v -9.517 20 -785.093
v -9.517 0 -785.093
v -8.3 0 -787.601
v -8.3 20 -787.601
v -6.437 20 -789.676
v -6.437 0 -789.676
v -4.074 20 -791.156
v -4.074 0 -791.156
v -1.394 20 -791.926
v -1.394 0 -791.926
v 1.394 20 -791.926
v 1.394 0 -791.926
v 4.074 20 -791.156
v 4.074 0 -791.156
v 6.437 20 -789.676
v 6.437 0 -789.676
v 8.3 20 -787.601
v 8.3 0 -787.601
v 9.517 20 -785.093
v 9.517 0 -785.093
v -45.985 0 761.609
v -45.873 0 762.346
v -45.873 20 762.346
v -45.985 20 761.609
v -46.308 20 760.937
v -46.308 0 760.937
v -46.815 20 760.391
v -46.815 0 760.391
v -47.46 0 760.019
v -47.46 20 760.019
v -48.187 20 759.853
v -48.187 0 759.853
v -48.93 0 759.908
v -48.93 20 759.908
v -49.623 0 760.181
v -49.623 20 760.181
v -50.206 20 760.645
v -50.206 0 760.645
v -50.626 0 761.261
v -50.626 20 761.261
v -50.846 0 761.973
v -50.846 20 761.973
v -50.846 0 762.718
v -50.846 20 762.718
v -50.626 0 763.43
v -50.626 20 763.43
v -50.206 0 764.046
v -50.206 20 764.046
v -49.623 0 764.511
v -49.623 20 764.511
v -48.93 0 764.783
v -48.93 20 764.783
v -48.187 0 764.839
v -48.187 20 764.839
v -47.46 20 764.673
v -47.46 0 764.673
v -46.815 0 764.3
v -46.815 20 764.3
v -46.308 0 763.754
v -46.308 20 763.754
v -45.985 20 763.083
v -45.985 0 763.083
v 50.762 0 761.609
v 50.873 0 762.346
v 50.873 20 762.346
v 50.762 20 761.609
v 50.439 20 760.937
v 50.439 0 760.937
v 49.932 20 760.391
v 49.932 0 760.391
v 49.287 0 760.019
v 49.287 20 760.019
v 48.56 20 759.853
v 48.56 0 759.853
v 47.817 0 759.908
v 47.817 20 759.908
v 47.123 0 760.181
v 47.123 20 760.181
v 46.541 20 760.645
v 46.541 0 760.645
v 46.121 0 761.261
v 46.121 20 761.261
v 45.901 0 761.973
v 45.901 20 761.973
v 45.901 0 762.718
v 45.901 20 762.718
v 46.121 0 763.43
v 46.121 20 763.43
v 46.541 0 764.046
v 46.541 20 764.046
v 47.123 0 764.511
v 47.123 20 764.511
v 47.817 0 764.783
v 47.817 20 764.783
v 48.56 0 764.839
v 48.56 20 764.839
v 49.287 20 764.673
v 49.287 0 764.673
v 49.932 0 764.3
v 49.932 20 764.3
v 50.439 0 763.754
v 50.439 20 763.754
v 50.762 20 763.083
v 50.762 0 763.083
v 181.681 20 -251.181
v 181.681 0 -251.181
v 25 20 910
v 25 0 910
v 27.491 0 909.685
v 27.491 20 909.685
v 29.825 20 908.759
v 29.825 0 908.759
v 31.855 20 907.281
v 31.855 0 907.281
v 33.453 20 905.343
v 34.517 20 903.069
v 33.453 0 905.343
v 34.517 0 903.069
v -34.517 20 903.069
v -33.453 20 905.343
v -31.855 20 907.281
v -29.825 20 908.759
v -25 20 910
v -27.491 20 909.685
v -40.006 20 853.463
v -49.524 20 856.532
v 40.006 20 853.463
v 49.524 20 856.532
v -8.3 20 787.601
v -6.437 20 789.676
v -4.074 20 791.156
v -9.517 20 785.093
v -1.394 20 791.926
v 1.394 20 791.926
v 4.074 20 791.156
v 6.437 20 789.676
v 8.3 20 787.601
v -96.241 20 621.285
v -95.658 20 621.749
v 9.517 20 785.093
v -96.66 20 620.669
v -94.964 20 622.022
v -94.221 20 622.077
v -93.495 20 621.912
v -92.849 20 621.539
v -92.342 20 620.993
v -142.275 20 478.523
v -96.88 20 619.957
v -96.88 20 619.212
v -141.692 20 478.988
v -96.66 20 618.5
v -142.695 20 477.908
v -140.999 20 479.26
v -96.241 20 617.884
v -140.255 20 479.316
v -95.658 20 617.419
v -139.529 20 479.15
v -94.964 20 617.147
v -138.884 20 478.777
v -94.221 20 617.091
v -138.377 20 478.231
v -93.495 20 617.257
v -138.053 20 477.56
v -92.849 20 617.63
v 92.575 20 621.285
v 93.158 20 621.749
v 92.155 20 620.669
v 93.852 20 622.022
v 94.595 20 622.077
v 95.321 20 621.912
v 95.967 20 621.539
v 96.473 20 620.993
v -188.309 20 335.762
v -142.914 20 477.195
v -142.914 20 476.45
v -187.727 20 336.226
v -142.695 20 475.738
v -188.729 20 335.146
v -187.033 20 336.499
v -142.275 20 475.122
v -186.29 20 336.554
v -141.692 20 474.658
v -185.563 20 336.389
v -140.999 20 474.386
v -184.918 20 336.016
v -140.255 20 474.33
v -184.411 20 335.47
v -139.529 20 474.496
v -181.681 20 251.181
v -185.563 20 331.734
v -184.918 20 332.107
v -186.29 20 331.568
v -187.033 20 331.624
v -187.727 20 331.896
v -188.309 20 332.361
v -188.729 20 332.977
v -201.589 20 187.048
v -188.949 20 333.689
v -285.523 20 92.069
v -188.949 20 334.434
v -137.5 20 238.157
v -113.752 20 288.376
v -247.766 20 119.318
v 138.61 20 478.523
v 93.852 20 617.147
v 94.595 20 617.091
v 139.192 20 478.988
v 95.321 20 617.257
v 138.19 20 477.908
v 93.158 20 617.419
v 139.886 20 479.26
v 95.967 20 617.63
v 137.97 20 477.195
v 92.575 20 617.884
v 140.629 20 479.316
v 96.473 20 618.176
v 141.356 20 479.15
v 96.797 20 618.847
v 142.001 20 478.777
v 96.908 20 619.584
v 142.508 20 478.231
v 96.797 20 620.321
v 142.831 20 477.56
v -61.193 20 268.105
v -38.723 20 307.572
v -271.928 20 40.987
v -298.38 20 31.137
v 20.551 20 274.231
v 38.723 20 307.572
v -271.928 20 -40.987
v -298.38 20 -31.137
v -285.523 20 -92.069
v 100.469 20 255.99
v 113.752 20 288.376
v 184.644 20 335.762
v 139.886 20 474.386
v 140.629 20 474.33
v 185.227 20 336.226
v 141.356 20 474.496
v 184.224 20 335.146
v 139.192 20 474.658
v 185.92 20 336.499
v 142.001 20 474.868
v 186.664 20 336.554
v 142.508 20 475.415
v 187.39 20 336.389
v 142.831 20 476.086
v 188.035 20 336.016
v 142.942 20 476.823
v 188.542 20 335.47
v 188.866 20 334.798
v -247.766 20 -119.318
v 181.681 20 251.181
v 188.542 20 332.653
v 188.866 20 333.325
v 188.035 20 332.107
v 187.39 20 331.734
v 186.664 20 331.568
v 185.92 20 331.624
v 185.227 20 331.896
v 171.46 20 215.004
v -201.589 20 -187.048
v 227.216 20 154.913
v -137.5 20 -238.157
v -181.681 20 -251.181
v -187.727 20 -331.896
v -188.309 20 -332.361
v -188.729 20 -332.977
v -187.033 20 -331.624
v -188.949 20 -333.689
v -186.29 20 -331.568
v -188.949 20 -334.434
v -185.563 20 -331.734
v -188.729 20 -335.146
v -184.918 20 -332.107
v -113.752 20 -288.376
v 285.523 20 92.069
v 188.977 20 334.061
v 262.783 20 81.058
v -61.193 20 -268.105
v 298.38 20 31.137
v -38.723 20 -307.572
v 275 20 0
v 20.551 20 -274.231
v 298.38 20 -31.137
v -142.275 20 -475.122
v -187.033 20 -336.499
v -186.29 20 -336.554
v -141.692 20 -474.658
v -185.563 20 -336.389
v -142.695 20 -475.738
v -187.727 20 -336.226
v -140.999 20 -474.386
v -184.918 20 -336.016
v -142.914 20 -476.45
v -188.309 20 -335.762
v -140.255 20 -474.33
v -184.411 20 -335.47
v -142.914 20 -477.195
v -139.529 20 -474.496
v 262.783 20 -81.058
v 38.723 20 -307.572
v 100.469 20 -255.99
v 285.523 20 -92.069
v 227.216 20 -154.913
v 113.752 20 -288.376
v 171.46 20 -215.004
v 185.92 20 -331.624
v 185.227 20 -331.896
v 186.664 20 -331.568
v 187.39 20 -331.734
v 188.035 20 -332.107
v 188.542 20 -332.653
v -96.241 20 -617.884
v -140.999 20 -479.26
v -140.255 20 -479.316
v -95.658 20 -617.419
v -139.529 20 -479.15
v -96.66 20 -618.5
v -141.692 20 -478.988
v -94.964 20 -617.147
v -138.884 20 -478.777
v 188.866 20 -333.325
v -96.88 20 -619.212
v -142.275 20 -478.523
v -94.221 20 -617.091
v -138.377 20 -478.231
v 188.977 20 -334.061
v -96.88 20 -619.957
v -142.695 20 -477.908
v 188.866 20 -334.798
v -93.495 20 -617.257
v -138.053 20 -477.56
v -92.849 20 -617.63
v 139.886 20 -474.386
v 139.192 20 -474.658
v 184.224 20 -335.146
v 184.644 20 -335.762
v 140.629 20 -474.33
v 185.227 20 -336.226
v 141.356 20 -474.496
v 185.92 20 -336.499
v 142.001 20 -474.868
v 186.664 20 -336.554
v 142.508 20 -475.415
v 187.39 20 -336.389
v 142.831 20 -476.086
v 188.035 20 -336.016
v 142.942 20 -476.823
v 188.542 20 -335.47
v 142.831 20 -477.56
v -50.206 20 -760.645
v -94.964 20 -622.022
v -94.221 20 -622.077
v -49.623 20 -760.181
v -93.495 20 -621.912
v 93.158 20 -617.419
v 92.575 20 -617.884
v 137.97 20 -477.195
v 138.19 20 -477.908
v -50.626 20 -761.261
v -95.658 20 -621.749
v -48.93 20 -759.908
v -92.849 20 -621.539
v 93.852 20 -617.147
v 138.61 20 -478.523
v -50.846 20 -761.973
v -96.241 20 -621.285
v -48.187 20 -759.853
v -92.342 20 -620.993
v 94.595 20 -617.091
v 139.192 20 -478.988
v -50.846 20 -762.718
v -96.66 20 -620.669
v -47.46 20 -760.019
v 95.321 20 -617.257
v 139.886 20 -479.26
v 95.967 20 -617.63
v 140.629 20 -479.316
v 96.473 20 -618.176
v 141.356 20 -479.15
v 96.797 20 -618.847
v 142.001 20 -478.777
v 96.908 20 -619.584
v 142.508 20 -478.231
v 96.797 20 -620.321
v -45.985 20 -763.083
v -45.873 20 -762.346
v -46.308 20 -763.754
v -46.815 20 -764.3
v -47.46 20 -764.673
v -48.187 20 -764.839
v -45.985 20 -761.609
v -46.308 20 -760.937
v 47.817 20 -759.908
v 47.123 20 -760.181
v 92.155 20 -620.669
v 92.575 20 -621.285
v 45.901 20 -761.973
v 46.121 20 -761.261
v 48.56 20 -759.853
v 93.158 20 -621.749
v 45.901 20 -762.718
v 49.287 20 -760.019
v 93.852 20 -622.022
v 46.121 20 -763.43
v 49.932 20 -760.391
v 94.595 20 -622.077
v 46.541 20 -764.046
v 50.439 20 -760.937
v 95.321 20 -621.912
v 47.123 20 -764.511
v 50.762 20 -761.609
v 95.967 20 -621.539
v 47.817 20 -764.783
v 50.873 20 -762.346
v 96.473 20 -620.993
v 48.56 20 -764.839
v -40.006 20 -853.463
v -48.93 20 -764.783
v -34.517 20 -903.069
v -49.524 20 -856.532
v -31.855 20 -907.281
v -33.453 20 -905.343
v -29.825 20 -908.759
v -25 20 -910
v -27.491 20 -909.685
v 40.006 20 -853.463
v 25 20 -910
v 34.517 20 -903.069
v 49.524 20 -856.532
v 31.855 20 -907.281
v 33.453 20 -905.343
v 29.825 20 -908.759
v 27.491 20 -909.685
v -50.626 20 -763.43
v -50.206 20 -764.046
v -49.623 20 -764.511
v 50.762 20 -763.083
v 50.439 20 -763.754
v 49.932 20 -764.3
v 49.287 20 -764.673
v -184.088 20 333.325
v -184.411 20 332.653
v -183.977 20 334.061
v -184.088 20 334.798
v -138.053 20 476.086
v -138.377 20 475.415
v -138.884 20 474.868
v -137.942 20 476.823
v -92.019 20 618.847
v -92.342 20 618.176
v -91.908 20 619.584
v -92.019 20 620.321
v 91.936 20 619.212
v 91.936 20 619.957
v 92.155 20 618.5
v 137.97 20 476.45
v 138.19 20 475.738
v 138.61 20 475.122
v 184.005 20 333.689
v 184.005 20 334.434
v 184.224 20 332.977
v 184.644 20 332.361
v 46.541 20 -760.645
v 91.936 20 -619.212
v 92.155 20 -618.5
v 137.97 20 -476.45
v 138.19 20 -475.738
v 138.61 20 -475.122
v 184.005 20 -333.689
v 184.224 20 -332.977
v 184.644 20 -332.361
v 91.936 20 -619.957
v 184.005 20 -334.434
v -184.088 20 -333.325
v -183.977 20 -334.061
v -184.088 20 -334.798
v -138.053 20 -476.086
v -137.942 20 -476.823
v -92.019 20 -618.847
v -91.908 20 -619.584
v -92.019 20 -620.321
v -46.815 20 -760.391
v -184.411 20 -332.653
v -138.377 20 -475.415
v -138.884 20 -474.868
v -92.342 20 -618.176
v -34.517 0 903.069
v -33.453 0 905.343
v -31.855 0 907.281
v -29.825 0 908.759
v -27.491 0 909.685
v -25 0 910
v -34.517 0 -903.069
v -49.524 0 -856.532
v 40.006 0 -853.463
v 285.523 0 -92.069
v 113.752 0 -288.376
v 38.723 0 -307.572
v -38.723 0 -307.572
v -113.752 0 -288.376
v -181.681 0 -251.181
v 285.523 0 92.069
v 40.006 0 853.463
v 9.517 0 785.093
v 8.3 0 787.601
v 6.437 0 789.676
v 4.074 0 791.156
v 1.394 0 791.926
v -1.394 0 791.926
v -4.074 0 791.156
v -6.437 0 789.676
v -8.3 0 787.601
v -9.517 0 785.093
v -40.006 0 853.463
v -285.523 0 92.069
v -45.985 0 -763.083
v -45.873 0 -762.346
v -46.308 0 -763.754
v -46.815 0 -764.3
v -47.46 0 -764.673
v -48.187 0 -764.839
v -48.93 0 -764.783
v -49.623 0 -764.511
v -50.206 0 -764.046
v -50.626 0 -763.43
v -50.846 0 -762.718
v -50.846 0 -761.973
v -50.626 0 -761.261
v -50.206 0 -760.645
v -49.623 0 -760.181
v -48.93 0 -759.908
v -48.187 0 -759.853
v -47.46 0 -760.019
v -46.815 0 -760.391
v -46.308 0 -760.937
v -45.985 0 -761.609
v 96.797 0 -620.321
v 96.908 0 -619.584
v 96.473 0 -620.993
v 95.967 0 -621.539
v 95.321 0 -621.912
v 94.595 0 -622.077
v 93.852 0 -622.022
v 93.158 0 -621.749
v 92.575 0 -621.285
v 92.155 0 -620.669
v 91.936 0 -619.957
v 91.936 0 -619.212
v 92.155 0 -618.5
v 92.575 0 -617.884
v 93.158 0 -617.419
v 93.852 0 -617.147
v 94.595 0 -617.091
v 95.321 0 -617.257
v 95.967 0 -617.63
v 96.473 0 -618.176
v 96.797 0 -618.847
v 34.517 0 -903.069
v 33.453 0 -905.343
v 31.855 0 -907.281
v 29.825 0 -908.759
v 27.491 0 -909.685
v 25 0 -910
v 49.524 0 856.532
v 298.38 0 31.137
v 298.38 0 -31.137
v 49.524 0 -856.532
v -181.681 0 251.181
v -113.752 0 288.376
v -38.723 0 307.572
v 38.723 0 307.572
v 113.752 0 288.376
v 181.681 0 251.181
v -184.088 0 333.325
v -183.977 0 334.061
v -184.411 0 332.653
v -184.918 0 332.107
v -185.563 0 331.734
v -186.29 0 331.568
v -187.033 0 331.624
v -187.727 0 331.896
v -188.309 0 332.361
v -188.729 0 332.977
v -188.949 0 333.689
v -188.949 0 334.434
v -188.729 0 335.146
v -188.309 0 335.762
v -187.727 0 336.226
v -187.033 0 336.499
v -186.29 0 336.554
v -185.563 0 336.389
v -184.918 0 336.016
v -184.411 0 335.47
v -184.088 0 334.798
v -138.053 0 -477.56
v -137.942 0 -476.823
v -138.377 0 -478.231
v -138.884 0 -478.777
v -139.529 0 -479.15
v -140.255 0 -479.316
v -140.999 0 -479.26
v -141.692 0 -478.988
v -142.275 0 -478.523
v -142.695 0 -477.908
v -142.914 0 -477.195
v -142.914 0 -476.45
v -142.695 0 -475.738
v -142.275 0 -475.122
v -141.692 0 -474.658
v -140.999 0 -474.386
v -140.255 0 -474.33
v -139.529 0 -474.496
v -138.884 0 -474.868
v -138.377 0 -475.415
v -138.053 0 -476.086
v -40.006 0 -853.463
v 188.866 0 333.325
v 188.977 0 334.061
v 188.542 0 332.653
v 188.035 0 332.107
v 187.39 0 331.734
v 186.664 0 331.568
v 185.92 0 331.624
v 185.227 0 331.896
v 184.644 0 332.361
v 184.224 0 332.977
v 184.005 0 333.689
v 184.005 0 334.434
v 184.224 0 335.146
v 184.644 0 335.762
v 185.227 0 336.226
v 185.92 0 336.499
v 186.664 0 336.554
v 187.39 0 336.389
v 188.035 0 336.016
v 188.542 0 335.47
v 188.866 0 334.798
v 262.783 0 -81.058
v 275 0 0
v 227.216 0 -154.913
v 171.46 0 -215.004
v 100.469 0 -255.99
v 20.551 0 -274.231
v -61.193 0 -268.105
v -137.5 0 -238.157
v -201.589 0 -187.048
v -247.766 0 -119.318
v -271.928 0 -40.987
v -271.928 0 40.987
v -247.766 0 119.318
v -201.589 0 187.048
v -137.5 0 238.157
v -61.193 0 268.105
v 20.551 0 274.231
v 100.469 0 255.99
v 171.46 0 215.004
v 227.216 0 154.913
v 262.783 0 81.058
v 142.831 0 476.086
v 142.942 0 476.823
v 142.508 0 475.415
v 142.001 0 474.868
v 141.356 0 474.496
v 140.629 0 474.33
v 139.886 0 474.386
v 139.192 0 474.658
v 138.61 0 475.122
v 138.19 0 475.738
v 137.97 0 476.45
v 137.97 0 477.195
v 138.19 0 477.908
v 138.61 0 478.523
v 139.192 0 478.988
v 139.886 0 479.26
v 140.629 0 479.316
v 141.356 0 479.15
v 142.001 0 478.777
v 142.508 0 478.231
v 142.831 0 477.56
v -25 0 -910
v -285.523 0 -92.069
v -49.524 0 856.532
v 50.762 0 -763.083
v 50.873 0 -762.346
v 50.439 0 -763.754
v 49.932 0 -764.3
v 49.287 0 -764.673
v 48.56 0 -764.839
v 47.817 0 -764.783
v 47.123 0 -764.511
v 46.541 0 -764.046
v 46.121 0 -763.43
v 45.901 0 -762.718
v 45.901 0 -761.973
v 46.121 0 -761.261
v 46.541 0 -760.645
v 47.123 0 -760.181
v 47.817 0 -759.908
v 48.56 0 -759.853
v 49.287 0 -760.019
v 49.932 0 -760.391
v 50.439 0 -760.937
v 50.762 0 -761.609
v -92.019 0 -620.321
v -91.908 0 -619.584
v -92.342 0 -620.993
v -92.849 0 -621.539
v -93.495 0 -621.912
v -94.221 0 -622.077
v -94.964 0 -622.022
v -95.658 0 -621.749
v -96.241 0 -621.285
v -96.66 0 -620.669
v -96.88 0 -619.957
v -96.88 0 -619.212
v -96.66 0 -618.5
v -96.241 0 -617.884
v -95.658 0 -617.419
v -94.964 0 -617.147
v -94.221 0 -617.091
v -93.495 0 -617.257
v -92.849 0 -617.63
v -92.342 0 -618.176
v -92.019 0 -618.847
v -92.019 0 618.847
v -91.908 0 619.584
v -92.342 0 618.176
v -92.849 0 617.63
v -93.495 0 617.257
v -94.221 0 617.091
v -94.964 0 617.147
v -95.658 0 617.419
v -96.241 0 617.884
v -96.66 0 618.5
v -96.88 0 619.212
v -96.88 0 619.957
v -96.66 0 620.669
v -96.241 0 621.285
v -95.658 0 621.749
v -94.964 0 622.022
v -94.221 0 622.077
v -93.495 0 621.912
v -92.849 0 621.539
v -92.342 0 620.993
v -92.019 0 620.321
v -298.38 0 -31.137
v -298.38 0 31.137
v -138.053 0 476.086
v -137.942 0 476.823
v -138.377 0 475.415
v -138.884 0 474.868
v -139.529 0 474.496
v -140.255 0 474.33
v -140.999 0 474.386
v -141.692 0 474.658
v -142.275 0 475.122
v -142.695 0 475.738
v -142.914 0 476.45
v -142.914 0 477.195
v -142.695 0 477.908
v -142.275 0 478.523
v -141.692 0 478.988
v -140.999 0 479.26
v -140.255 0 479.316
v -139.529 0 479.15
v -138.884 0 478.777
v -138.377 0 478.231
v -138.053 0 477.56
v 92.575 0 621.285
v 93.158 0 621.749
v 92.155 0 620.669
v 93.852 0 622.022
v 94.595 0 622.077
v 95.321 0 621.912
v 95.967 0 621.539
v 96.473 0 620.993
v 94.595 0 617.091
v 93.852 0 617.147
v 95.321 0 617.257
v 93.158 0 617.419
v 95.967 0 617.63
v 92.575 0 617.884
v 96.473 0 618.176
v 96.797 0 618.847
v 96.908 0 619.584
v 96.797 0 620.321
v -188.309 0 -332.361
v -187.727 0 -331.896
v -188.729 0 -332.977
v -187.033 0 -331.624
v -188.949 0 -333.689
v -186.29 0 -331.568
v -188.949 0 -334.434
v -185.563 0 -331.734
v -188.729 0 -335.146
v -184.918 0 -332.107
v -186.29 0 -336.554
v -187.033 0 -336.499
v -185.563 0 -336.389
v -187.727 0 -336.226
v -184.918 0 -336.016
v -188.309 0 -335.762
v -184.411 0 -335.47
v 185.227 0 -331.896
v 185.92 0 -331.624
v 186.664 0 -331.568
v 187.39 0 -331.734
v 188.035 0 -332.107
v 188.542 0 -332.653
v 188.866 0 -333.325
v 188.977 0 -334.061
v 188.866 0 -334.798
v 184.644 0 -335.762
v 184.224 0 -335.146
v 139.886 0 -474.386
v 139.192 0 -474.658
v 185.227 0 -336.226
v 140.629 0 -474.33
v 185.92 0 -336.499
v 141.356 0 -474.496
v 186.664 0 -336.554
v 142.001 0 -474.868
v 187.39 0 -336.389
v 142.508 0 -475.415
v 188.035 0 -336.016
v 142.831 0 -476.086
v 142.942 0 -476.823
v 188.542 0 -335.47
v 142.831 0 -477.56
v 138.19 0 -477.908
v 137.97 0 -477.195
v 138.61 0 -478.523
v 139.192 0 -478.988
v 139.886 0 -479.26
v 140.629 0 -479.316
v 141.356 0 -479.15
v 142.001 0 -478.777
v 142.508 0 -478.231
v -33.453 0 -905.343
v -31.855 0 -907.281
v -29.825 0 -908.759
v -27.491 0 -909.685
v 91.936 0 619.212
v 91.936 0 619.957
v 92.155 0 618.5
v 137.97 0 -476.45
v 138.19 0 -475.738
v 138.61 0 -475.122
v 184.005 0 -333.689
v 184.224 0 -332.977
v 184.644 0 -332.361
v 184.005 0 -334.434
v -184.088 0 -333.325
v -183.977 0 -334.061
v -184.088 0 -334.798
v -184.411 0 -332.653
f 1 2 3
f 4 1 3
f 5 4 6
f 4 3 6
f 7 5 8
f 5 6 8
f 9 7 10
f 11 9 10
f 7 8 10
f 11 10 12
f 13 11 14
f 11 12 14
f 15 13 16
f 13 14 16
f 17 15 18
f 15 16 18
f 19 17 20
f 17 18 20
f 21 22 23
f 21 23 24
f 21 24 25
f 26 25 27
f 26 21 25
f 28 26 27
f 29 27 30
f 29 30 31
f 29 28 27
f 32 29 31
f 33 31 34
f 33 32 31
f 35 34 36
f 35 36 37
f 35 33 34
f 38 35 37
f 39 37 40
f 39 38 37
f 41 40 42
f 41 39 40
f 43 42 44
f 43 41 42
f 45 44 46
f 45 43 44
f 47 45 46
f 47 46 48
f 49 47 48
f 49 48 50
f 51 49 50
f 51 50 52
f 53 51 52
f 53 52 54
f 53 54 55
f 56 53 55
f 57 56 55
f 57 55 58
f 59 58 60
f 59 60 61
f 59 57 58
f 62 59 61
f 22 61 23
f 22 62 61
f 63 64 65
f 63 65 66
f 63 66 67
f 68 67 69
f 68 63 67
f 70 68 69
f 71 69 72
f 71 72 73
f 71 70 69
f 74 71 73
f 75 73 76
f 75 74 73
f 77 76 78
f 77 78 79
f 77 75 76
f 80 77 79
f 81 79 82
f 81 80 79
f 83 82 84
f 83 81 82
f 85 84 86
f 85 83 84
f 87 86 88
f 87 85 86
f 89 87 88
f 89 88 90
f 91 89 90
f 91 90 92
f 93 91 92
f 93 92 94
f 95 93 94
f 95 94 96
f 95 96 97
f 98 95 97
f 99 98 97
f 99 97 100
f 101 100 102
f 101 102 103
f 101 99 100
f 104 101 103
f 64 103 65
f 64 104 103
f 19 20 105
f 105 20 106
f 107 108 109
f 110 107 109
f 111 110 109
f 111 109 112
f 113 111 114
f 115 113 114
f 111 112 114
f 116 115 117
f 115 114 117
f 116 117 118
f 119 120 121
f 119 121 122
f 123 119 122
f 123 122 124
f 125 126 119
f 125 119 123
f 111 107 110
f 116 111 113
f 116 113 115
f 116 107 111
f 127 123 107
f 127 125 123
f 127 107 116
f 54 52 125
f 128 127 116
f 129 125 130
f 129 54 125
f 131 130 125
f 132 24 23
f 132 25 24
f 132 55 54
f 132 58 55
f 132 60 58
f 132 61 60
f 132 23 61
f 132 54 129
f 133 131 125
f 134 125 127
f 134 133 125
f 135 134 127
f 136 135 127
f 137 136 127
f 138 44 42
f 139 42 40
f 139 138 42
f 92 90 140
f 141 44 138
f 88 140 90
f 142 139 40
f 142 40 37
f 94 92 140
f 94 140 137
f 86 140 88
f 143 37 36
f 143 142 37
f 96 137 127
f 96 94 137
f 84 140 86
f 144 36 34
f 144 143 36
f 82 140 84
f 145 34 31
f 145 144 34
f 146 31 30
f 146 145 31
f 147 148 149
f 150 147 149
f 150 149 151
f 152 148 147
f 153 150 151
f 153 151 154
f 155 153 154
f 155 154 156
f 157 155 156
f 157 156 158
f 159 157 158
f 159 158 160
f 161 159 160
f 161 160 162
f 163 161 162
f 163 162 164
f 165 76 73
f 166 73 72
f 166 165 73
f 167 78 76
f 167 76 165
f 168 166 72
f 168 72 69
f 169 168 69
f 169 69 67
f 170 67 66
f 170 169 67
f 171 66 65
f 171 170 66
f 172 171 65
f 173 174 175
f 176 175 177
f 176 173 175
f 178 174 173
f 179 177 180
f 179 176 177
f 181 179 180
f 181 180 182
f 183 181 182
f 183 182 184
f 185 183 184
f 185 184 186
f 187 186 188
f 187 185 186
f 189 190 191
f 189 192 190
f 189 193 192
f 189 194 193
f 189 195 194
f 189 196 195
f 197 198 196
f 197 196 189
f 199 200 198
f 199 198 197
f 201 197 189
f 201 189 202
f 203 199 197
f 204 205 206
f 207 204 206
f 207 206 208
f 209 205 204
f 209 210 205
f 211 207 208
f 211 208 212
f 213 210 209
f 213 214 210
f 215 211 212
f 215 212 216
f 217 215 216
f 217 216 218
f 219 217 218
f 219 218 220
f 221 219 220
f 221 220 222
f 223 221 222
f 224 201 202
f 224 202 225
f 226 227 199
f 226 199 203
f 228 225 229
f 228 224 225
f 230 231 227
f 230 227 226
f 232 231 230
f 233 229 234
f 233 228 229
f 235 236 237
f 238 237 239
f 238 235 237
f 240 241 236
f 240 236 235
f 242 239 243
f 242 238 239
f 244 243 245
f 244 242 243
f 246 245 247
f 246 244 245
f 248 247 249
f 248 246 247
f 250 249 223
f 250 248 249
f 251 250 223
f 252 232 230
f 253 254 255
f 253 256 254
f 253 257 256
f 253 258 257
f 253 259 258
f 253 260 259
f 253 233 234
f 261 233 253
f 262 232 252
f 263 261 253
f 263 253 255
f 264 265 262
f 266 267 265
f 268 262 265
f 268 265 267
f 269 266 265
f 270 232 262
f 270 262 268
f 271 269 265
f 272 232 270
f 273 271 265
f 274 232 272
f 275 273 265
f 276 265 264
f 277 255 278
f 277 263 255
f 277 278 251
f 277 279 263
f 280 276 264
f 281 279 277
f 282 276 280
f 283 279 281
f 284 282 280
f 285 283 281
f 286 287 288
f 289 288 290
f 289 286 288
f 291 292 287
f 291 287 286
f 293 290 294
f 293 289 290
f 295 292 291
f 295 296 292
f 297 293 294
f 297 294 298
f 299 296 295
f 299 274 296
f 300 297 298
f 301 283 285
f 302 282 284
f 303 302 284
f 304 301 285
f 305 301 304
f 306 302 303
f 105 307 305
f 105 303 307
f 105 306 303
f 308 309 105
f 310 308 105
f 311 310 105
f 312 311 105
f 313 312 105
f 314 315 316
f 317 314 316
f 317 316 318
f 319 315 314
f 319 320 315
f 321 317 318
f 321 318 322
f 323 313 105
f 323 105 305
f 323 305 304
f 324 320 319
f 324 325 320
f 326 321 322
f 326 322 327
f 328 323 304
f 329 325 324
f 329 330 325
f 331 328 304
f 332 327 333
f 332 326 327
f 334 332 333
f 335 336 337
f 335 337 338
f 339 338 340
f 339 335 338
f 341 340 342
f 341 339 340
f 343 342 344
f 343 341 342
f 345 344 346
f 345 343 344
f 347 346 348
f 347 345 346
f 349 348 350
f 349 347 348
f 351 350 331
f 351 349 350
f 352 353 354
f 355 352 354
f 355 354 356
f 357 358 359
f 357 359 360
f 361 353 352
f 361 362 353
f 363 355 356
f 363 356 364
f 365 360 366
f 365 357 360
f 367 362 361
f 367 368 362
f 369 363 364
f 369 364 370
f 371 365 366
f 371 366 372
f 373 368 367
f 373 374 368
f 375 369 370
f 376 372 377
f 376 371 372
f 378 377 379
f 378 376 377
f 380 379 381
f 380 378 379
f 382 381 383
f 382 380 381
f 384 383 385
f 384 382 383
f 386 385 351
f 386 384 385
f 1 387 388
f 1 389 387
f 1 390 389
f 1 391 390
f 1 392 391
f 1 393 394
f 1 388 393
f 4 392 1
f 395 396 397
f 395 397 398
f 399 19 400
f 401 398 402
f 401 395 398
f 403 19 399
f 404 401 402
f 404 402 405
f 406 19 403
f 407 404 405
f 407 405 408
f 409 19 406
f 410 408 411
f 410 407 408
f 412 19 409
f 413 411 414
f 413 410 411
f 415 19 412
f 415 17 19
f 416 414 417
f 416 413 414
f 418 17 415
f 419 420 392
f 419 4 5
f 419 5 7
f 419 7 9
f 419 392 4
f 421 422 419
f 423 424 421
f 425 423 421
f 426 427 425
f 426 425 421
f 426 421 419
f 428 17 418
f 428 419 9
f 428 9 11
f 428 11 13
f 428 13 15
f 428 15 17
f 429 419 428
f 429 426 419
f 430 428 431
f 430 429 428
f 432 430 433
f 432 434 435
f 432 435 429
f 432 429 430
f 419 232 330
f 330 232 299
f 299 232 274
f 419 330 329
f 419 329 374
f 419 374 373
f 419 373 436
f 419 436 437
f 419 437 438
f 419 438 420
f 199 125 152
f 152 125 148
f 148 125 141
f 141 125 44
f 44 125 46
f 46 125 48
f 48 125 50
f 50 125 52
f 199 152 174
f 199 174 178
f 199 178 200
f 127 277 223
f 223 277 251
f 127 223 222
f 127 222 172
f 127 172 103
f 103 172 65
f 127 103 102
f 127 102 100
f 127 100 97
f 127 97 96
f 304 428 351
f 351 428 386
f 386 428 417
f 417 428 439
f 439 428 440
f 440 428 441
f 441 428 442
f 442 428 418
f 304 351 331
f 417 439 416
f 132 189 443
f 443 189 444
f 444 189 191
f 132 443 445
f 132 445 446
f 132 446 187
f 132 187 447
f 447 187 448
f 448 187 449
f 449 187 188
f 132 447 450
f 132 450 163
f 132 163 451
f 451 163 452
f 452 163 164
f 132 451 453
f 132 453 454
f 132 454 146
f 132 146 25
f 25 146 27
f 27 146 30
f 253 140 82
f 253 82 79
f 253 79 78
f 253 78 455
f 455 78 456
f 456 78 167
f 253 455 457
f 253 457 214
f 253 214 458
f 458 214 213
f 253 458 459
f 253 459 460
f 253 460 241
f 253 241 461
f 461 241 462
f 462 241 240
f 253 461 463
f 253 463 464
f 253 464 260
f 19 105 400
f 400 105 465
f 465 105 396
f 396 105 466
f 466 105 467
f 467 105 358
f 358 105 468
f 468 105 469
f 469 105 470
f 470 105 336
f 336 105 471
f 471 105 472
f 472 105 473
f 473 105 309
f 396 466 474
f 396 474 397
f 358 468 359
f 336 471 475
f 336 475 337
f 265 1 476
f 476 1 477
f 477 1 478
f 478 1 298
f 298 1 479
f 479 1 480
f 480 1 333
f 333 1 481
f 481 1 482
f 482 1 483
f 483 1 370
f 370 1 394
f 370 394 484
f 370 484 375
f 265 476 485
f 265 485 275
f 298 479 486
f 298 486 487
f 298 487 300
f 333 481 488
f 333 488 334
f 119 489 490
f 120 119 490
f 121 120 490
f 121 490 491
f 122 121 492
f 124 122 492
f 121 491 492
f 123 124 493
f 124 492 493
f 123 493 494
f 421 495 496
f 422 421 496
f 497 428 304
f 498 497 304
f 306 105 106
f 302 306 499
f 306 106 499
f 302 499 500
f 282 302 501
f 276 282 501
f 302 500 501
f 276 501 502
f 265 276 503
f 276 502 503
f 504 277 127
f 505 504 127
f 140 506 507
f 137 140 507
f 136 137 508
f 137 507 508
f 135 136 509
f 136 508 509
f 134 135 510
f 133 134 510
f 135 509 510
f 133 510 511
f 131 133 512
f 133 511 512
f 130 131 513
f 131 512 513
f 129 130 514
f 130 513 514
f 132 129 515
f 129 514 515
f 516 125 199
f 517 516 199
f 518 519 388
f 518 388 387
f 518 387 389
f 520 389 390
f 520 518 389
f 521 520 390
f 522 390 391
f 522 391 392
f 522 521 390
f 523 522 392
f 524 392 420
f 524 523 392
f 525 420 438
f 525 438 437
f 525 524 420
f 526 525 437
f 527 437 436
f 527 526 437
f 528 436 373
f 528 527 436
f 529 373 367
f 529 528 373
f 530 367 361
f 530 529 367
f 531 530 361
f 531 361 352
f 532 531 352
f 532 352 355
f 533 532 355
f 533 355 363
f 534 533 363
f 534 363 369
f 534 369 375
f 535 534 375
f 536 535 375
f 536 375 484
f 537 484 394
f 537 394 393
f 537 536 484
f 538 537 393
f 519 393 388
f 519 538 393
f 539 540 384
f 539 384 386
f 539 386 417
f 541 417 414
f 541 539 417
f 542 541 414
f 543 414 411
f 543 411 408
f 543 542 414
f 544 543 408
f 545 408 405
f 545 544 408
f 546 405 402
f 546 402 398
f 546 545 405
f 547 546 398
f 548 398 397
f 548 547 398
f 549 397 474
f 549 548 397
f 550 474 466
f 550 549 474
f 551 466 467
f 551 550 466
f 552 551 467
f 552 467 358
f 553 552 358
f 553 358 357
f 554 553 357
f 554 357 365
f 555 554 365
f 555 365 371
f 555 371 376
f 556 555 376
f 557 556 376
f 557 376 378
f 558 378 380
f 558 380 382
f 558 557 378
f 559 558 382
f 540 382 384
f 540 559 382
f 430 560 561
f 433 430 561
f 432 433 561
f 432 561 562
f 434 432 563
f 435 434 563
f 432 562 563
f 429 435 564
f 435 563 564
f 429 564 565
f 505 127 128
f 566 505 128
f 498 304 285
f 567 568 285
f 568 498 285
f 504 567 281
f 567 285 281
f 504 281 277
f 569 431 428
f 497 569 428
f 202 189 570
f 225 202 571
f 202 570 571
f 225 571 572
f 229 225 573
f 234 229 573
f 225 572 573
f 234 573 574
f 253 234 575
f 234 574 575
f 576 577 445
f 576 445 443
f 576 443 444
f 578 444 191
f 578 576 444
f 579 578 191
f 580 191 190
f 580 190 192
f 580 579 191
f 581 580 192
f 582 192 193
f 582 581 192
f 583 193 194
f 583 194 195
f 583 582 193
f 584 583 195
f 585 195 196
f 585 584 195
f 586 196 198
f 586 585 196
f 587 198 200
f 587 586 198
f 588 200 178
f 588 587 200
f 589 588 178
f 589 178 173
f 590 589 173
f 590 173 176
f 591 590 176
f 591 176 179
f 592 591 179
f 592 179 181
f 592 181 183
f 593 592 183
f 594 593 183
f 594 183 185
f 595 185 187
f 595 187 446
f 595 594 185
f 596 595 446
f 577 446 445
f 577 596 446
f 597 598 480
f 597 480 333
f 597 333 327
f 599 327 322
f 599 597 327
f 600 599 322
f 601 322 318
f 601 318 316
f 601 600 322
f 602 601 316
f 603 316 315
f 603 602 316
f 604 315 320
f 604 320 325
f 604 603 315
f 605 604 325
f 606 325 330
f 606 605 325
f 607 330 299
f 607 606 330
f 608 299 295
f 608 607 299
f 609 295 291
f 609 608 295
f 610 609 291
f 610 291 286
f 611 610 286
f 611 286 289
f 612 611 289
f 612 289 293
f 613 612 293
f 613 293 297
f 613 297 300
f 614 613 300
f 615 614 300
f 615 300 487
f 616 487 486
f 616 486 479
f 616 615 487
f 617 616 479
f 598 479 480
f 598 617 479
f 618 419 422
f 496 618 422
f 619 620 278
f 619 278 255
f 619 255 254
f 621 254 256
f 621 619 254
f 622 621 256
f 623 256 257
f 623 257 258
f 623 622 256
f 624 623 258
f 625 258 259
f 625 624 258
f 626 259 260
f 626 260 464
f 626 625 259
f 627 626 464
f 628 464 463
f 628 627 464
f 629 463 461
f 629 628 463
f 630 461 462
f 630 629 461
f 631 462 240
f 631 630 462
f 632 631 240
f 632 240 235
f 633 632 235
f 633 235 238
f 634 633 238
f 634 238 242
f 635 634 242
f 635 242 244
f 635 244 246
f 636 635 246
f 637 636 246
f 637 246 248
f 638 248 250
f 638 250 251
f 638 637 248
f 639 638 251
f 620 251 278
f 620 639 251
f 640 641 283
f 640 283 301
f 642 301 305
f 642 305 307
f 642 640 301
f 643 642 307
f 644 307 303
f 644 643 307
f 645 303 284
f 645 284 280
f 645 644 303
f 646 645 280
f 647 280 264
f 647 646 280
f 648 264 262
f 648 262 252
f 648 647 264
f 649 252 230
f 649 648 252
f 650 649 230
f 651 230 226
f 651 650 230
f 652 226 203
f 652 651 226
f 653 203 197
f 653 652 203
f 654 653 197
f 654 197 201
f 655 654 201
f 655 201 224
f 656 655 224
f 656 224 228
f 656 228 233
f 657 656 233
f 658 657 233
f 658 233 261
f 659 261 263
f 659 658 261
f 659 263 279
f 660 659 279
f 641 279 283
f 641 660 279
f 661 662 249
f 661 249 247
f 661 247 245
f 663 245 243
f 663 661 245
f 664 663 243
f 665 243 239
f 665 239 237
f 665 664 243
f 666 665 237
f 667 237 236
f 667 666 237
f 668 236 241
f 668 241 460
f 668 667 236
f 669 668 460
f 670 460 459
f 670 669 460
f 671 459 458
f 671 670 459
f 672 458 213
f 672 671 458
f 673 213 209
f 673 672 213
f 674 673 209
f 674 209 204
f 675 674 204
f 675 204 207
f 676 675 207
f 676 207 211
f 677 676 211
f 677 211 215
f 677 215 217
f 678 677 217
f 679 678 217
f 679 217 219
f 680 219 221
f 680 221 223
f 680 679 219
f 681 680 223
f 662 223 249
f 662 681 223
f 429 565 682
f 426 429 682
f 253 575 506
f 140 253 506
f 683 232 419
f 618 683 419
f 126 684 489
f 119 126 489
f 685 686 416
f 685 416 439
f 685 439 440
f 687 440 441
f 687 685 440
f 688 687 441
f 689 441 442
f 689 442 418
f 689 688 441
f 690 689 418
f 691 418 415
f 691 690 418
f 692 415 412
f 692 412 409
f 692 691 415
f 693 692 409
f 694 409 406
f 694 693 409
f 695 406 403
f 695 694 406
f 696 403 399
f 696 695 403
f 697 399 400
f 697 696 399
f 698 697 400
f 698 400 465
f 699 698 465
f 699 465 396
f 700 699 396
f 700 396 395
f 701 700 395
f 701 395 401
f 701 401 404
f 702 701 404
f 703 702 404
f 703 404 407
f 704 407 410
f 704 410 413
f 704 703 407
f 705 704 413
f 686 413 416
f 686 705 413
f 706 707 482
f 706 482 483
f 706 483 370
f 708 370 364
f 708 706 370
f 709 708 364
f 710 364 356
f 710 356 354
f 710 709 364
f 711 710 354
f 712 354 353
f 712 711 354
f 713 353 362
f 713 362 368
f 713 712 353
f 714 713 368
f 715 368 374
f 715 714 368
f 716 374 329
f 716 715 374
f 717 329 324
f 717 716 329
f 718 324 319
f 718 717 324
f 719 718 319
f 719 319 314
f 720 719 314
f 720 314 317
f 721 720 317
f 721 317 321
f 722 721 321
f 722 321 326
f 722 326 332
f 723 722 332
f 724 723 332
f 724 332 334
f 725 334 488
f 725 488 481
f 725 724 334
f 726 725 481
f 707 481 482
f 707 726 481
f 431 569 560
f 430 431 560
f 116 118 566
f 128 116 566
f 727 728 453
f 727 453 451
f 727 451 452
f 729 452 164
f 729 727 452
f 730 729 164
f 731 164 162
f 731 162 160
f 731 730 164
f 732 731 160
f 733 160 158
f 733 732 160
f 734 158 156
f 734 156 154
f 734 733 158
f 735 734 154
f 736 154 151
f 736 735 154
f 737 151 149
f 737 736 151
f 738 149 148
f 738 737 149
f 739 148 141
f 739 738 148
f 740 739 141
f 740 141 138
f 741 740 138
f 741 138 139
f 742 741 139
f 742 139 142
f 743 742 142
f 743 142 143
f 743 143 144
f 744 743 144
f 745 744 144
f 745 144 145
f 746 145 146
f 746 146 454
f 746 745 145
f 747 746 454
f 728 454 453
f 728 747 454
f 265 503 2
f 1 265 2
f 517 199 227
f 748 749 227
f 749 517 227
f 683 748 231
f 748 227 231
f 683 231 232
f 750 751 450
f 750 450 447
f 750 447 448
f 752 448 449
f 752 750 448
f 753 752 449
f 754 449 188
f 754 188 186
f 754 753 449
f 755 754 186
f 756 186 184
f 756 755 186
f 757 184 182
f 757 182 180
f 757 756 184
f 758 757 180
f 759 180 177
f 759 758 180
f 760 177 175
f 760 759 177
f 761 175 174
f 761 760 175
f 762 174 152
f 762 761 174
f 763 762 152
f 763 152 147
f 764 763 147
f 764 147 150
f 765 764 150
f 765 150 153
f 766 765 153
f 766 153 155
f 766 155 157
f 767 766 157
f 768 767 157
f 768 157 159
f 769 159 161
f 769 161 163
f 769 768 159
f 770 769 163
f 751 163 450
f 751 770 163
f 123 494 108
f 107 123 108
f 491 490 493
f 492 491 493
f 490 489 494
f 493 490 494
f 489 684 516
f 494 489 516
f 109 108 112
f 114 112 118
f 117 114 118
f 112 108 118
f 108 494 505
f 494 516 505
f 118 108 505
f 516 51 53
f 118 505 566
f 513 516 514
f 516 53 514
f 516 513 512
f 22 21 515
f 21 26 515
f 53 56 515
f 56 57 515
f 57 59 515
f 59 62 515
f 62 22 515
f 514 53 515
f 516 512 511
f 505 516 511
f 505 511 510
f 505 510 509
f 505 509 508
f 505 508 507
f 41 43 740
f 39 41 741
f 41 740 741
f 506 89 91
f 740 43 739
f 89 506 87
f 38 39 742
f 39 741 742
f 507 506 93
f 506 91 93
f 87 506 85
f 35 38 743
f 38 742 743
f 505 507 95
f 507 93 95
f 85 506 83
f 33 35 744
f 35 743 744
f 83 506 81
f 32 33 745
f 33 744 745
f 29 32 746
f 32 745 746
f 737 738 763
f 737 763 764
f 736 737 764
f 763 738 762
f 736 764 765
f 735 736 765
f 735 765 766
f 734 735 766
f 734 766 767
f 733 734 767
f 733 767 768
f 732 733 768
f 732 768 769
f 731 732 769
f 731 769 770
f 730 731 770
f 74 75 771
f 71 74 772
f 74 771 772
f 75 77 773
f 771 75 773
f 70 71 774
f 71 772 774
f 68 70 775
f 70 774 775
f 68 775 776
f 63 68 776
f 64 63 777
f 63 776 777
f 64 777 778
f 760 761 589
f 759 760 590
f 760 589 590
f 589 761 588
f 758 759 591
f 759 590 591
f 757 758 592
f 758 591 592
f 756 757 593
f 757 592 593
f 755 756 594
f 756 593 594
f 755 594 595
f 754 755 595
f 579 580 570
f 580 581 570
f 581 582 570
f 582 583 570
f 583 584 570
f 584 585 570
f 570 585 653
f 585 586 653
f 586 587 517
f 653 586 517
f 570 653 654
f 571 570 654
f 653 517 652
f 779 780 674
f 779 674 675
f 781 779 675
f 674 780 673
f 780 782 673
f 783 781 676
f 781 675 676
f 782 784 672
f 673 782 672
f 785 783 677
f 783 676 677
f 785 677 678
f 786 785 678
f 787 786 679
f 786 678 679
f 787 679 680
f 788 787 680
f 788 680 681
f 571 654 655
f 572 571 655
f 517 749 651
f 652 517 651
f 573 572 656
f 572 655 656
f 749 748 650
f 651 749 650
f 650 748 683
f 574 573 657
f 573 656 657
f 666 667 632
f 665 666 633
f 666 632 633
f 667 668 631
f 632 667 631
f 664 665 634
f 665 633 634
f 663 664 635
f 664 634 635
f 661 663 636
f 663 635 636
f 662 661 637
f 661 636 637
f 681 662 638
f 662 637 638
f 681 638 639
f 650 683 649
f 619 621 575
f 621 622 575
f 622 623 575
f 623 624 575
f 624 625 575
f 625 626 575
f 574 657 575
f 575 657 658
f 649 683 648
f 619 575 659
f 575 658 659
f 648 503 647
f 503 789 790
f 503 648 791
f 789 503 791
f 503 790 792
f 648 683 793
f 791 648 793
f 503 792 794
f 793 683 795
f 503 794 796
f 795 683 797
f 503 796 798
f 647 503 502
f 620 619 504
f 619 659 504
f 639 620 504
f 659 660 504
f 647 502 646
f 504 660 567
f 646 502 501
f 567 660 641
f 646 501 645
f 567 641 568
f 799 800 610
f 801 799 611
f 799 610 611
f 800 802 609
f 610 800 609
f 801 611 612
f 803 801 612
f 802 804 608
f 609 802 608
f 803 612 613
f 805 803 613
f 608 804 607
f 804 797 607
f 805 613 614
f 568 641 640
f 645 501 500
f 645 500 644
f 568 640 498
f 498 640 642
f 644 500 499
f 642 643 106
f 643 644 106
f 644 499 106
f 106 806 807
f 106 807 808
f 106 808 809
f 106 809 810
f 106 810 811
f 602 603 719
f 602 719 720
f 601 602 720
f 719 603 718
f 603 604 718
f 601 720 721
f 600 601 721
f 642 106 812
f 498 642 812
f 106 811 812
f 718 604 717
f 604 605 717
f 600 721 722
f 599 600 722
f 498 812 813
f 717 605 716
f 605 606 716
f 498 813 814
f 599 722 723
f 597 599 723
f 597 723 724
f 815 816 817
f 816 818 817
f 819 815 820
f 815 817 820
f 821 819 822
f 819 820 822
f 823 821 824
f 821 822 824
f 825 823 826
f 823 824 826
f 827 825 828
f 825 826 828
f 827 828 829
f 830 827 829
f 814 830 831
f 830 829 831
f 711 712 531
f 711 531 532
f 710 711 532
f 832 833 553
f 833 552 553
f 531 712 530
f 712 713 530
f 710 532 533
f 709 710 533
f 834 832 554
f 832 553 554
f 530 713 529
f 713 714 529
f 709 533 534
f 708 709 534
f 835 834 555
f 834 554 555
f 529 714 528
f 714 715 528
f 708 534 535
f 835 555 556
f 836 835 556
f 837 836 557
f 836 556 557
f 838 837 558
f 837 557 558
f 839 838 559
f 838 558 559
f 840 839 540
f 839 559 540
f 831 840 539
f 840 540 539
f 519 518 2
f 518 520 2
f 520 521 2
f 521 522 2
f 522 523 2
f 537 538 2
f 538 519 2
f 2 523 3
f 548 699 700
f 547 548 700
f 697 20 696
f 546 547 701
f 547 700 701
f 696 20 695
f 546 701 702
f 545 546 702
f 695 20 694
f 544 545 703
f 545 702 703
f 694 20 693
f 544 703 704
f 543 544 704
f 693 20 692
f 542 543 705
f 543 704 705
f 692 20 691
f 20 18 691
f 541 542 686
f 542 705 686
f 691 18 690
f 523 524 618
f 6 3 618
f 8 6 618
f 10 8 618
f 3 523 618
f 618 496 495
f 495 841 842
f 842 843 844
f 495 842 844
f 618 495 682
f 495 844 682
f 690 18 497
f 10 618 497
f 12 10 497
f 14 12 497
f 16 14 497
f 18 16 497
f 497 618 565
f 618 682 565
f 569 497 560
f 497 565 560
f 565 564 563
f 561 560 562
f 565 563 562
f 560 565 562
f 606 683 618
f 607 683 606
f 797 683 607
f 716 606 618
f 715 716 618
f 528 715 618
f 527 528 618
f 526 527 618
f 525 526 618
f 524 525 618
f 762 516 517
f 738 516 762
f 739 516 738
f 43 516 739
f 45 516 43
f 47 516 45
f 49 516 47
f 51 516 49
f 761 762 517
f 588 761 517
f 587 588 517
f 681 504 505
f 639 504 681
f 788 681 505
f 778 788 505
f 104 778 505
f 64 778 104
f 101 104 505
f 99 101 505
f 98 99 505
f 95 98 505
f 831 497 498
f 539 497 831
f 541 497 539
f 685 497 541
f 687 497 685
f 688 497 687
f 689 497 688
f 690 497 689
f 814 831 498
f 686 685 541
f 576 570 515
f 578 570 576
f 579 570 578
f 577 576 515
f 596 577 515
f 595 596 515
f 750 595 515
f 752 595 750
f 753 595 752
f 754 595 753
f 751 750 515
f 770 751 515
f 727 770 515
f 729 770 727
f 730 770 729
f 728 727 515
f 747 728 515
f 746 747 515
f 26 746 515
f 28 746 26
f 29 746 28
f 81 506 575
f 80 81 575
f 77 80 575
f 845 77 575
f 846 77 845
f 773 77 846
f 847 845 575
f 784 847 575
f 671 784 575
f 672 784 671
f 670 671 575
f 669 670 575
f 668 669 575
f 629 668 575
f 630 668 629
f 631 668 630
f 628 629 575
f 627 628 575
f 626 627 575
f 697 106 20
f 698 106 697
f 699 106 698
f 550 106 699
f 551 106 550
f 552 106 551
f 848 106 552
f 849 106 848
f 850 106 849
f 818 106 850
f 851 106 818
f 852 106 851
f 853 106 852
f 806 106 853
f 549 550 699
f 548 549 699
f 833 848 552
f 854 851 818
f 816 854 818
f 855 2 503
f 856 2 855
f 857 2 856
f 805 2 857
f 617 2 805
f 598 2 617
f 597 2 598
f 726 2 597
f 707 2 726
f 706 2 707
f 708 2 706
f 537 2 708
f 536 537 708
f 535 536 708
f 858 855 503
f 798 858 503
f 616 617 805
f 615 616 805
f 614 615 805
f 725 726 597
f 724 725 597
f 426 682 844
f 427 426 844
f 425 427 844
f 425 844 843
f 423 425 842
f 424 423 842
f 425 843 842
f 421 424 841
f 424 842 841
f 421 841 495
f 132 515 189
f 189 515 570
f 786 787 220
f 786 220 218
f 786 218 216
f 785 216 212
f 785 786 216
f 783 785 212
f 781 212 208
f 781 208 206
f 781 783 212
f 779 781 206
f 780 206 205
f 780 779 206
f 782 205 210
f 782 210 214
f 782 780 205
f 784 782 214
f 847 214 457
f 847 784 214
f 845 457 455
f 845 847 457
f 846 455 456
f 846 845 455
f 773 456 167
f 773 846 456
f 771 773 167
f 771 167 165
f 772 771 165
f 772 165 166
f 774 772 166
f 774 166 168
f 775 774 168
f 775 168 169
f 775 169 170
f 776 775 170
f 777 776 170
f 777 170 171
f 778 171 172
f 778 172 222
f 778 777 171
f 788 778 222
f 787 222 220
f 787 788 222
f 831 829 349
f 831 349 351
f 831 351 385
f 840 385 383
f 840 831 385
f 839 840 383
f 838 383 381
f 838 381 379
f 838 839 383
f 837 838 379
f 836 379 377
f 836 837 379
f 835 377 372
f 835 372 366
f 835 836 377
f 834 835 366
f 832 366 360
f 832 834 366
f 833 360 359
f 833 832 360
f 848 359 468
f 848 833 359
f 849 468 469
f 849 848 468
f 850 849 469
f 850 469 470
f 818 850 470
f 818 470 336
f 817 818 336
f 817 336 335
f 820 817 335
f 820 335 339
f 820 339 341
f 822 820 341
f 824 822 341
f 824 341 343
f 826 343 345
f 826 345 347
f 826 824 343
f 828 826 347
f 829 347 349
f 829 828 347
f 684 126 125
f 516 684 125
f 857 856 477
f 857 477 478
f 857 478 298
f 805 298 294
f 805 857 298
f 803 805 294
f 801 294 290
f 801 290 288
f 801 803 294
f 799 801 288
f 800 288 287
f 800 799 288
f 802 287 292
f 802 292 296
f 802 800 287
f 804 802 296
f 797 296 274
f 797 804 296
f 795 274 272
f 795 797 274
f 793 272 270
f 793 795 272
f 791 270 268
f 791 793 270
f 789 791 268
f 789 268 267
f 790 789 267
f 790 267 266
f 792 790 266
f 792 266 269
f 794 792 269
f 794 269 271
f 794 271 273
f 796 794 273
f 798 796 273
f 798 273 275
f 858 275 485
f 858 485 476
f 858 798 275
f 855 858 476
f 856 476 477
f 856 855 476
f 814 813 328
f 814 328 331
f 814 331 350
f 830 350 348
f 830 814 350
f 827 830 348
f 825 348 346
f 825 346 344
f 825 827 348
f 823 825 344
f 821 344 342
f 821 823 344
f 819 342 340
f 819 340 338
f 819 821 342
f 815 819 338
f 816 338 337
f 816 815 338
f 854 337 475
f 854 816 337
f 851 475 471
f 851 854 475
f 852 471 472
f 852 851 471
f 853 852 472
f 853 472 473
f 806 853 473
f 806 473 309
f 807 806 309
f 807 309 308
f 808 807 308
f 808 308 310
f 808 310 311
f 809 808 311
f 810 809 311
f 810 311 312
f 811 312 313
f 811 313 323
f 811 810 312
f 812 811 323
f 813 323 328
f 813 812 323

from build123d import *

# Parameters (mm, degrees)
SKETCH2_R           = 2.5
SKETCH2_R_2         = 275
BOSS_EXTRUDE1_DEPTH = 20
CUT_EXTRUDE1_DEPTH  = 21


with BuildPart() as part:
    # Sketch2 → Boss-Extrude1 (new body)
    with BuildSketch(Plane(origin=(0, 0, 0), x_dir=(1, 0, 0), z_dir=(0, 1, 0))):
        with BuildLine():
            Line((-34.517430478, 903.068960265), (-295.040344804, 95.1377682))
            ThreePointArc((-295.040344804, 95.1377682), (-310, 0), (-295.040344804, -95.1377682))
            Line((-295.040344804, -95.1377682), (-34.517430478, -903.068960265))
            ThreePointArc((-34.517430478, -903.068960265), (-30.886866626, -908.083613135), (-25, -910))
            Line((-25, -910), (25, -910))
            ThreePointArc((25, -910), (30.886866626, -908.083613135), (34.517430478, -903.068960265))
            Line((34.517430478, -903.068960265), (295.040344804, -95.1377682))
            ThreePointArc((295.040344804, -95.1377682), (310, 0), (295.040344804, 95.1377682))
            Line((295.040344804, 95.1377682), (34.517430478, 903.068960265))
            ThreePointArc((34.517430478, 903.068960265), (30.886866626, 908.083613135), (25, 910))
            Line((25, 910), (-25, 910))
            ThreePointArc((-25, 910), (-30.886866626, 908.083613135), (-34.517430478, 903.068960265))
        make_face()
        with Locations((-48.373467006, -762.345774842)):
            Circle(SKETCH2_R, mode=Mode.SUBTRACT)
        with Locations((-94.407870974, -619.584317679)):
            Circle(SKETCH2_R, mode=Mode.SUBTRACT)
        with Locations((-140.442274942, -476.822860516)):
            Circle(SKETCH2_R, mode=Mode.SUBTRACT)
        with BuildLine():
            ThreePointArc((-181.680791071, -251.181388952), (0, -310), (181.680791071, -251.181388952))
            Line((181.680791071, -251.181388952), (9.517430478, -785.092770658))
            ThreePointArc((9.517430478, -785.092770658), (0, -792.023810393), (-9.517430478, -785.092770658))
            Line((-9.517430478, -785.092770658), (-181.680791071, -251.181388952))
        make_face(mode=Mode.SUBTRACT)
        with Locations((-186.476678909, -334.061403353)):
            Circle(SKETCH2_R, mode=Mode.SUBTRACT)
        with Locations((48.373467006, -762.345774842)):
            Circle(SKETCH2_R, mode=Mode.SUBTRACT)
        with Locations((94.407870974, -619.584317679)):
            Circle(SKETCH2_R, mode=Mode.SUBTRACT)
        with Locations((140.442274942, -476.822860516)):
            Circle(SKETCH2_R, mode=Mode.SUBTRACT)
        with Locations((186.476678909, -334.061403353)):
            Circle(SKETCH2_R, mode=Mode.SUBTRACT)
        with Locations((-186.476678909, 334.061403353)):
            Circle(SKETCH2_R, mode=Mode.SUBTRACT)
        with Locations((-140.442274942, 476.822860516)):
            Circle(SKETCH2_R, mode=Mode.SUBTRACT)
        with Locations((-94.407870974, 619.584317679)):
            Circle(SKETCH2_R, mode=Mode.SUBTRACT)
        with BuildLine():
            ThreePointArc((181.680791071, 251.181388952), (0, 310), (-181.680791071, 251.181388952))
            Line((-181.680791071, 251.181388952), (-9.517430478, 785.092770658))
            ThreePointArc((-9.517430478, 785.092770658), (0, 792.023810393), (9.517430478, 785.092770658))
            Line((9.517430478, 785.092770658), (181.680791071, 251.181388952))
        make_face(mode=Mode.SUBTRACT)
        with Locations((-48.373467006, 762.345774842)):
            Circle(SKETCH2_R, mode=Mode.SUBTRACT)
        Circle(SKETCH2_R_2, mode=Mode.SUBTRACT)
        with Locations((186.476678909, 334.061403353)):
            Circle(SKETCH2_R, mode=Mode.SUBTRACT)
        with Locations((140.442274942, 476.822860516)):
            Circle(SKETCH2_R, mode=Mode.SUBTRACT)
        with Locations((94.407870974, 619.584317679)):
            Circle(SKETCH2_R, mode=Mode.SUBTRACT)
        with Locations((48.373467006, 762.345774842)):
            Circle(SKETCH2_R, mode=Mode.SUBTRACT)
    extrude(amount=BOSS_EXTRUDE1_DEPTH)

    # Sketch3 → Cut-Extrude1 (cut, through all)
    with BuildSketch(Plane(origin=(0, 20, 0), x_dir=(1, 0, 0), z_dir=(0, 1, 0))):
        with BuildLine():
            Line((-295.040344804, -95.1377682), (-49.523523643, -856.532206403))
            Line((-49.523523643, -856.532206403), (-40.006093165, -853.463246139))
            Line((-40.006093165, -853.463246139), (-285.522914326, -92.068807935))
            ThreePointArc((-285.522914326, -92.068807935), (-300, 0), (-285.522914326, 92.068807935))
            Line((-285.522914326, 92.068807935), (-40.006093165, 853.463246139))
            Line((-40.006093165, 853.463246139), (-49.523523643, 856.532206403))
            Line((-49.523523643, 856.532206403), (-295.040344804, 95.1377682))
            ThreePointArc((-295.040344804, 95.1377682), (-310, 0), (-295.040344804, -95.1377682))
        make_face()
        with BuildLine():
            Line((295.040344804, 95.1377682), (49.523523643, 856.532206403))
            Line((49.523523643, 856.532206403), (40.006093165, 853.463246139))
            Line((40.006093165, 853.463246139), (285.522914326, 92.068807935))
            ThreePointArc((285.522914326, 92.068807935), (300, 0), (285.522914326, -92.068807935))
            Line((285.522914326, -92.068807935), (40.006093165, -853.463246139))
            Line((40.006093165, -853.463246139), (49.523523643, -856.532206403))
            Line((49.523523643, -856.532206403), (295.040344804, -95.1377682))
            ThreePointArc((295.040344804, -95.1377682), (310, 0), (295.040344804, 95.1377682))
        make_face()
    extrude(amount=-CUT_EXTRUDE1_DEPTH, mode=Mode.SUBTRACT)


solid = part.part
